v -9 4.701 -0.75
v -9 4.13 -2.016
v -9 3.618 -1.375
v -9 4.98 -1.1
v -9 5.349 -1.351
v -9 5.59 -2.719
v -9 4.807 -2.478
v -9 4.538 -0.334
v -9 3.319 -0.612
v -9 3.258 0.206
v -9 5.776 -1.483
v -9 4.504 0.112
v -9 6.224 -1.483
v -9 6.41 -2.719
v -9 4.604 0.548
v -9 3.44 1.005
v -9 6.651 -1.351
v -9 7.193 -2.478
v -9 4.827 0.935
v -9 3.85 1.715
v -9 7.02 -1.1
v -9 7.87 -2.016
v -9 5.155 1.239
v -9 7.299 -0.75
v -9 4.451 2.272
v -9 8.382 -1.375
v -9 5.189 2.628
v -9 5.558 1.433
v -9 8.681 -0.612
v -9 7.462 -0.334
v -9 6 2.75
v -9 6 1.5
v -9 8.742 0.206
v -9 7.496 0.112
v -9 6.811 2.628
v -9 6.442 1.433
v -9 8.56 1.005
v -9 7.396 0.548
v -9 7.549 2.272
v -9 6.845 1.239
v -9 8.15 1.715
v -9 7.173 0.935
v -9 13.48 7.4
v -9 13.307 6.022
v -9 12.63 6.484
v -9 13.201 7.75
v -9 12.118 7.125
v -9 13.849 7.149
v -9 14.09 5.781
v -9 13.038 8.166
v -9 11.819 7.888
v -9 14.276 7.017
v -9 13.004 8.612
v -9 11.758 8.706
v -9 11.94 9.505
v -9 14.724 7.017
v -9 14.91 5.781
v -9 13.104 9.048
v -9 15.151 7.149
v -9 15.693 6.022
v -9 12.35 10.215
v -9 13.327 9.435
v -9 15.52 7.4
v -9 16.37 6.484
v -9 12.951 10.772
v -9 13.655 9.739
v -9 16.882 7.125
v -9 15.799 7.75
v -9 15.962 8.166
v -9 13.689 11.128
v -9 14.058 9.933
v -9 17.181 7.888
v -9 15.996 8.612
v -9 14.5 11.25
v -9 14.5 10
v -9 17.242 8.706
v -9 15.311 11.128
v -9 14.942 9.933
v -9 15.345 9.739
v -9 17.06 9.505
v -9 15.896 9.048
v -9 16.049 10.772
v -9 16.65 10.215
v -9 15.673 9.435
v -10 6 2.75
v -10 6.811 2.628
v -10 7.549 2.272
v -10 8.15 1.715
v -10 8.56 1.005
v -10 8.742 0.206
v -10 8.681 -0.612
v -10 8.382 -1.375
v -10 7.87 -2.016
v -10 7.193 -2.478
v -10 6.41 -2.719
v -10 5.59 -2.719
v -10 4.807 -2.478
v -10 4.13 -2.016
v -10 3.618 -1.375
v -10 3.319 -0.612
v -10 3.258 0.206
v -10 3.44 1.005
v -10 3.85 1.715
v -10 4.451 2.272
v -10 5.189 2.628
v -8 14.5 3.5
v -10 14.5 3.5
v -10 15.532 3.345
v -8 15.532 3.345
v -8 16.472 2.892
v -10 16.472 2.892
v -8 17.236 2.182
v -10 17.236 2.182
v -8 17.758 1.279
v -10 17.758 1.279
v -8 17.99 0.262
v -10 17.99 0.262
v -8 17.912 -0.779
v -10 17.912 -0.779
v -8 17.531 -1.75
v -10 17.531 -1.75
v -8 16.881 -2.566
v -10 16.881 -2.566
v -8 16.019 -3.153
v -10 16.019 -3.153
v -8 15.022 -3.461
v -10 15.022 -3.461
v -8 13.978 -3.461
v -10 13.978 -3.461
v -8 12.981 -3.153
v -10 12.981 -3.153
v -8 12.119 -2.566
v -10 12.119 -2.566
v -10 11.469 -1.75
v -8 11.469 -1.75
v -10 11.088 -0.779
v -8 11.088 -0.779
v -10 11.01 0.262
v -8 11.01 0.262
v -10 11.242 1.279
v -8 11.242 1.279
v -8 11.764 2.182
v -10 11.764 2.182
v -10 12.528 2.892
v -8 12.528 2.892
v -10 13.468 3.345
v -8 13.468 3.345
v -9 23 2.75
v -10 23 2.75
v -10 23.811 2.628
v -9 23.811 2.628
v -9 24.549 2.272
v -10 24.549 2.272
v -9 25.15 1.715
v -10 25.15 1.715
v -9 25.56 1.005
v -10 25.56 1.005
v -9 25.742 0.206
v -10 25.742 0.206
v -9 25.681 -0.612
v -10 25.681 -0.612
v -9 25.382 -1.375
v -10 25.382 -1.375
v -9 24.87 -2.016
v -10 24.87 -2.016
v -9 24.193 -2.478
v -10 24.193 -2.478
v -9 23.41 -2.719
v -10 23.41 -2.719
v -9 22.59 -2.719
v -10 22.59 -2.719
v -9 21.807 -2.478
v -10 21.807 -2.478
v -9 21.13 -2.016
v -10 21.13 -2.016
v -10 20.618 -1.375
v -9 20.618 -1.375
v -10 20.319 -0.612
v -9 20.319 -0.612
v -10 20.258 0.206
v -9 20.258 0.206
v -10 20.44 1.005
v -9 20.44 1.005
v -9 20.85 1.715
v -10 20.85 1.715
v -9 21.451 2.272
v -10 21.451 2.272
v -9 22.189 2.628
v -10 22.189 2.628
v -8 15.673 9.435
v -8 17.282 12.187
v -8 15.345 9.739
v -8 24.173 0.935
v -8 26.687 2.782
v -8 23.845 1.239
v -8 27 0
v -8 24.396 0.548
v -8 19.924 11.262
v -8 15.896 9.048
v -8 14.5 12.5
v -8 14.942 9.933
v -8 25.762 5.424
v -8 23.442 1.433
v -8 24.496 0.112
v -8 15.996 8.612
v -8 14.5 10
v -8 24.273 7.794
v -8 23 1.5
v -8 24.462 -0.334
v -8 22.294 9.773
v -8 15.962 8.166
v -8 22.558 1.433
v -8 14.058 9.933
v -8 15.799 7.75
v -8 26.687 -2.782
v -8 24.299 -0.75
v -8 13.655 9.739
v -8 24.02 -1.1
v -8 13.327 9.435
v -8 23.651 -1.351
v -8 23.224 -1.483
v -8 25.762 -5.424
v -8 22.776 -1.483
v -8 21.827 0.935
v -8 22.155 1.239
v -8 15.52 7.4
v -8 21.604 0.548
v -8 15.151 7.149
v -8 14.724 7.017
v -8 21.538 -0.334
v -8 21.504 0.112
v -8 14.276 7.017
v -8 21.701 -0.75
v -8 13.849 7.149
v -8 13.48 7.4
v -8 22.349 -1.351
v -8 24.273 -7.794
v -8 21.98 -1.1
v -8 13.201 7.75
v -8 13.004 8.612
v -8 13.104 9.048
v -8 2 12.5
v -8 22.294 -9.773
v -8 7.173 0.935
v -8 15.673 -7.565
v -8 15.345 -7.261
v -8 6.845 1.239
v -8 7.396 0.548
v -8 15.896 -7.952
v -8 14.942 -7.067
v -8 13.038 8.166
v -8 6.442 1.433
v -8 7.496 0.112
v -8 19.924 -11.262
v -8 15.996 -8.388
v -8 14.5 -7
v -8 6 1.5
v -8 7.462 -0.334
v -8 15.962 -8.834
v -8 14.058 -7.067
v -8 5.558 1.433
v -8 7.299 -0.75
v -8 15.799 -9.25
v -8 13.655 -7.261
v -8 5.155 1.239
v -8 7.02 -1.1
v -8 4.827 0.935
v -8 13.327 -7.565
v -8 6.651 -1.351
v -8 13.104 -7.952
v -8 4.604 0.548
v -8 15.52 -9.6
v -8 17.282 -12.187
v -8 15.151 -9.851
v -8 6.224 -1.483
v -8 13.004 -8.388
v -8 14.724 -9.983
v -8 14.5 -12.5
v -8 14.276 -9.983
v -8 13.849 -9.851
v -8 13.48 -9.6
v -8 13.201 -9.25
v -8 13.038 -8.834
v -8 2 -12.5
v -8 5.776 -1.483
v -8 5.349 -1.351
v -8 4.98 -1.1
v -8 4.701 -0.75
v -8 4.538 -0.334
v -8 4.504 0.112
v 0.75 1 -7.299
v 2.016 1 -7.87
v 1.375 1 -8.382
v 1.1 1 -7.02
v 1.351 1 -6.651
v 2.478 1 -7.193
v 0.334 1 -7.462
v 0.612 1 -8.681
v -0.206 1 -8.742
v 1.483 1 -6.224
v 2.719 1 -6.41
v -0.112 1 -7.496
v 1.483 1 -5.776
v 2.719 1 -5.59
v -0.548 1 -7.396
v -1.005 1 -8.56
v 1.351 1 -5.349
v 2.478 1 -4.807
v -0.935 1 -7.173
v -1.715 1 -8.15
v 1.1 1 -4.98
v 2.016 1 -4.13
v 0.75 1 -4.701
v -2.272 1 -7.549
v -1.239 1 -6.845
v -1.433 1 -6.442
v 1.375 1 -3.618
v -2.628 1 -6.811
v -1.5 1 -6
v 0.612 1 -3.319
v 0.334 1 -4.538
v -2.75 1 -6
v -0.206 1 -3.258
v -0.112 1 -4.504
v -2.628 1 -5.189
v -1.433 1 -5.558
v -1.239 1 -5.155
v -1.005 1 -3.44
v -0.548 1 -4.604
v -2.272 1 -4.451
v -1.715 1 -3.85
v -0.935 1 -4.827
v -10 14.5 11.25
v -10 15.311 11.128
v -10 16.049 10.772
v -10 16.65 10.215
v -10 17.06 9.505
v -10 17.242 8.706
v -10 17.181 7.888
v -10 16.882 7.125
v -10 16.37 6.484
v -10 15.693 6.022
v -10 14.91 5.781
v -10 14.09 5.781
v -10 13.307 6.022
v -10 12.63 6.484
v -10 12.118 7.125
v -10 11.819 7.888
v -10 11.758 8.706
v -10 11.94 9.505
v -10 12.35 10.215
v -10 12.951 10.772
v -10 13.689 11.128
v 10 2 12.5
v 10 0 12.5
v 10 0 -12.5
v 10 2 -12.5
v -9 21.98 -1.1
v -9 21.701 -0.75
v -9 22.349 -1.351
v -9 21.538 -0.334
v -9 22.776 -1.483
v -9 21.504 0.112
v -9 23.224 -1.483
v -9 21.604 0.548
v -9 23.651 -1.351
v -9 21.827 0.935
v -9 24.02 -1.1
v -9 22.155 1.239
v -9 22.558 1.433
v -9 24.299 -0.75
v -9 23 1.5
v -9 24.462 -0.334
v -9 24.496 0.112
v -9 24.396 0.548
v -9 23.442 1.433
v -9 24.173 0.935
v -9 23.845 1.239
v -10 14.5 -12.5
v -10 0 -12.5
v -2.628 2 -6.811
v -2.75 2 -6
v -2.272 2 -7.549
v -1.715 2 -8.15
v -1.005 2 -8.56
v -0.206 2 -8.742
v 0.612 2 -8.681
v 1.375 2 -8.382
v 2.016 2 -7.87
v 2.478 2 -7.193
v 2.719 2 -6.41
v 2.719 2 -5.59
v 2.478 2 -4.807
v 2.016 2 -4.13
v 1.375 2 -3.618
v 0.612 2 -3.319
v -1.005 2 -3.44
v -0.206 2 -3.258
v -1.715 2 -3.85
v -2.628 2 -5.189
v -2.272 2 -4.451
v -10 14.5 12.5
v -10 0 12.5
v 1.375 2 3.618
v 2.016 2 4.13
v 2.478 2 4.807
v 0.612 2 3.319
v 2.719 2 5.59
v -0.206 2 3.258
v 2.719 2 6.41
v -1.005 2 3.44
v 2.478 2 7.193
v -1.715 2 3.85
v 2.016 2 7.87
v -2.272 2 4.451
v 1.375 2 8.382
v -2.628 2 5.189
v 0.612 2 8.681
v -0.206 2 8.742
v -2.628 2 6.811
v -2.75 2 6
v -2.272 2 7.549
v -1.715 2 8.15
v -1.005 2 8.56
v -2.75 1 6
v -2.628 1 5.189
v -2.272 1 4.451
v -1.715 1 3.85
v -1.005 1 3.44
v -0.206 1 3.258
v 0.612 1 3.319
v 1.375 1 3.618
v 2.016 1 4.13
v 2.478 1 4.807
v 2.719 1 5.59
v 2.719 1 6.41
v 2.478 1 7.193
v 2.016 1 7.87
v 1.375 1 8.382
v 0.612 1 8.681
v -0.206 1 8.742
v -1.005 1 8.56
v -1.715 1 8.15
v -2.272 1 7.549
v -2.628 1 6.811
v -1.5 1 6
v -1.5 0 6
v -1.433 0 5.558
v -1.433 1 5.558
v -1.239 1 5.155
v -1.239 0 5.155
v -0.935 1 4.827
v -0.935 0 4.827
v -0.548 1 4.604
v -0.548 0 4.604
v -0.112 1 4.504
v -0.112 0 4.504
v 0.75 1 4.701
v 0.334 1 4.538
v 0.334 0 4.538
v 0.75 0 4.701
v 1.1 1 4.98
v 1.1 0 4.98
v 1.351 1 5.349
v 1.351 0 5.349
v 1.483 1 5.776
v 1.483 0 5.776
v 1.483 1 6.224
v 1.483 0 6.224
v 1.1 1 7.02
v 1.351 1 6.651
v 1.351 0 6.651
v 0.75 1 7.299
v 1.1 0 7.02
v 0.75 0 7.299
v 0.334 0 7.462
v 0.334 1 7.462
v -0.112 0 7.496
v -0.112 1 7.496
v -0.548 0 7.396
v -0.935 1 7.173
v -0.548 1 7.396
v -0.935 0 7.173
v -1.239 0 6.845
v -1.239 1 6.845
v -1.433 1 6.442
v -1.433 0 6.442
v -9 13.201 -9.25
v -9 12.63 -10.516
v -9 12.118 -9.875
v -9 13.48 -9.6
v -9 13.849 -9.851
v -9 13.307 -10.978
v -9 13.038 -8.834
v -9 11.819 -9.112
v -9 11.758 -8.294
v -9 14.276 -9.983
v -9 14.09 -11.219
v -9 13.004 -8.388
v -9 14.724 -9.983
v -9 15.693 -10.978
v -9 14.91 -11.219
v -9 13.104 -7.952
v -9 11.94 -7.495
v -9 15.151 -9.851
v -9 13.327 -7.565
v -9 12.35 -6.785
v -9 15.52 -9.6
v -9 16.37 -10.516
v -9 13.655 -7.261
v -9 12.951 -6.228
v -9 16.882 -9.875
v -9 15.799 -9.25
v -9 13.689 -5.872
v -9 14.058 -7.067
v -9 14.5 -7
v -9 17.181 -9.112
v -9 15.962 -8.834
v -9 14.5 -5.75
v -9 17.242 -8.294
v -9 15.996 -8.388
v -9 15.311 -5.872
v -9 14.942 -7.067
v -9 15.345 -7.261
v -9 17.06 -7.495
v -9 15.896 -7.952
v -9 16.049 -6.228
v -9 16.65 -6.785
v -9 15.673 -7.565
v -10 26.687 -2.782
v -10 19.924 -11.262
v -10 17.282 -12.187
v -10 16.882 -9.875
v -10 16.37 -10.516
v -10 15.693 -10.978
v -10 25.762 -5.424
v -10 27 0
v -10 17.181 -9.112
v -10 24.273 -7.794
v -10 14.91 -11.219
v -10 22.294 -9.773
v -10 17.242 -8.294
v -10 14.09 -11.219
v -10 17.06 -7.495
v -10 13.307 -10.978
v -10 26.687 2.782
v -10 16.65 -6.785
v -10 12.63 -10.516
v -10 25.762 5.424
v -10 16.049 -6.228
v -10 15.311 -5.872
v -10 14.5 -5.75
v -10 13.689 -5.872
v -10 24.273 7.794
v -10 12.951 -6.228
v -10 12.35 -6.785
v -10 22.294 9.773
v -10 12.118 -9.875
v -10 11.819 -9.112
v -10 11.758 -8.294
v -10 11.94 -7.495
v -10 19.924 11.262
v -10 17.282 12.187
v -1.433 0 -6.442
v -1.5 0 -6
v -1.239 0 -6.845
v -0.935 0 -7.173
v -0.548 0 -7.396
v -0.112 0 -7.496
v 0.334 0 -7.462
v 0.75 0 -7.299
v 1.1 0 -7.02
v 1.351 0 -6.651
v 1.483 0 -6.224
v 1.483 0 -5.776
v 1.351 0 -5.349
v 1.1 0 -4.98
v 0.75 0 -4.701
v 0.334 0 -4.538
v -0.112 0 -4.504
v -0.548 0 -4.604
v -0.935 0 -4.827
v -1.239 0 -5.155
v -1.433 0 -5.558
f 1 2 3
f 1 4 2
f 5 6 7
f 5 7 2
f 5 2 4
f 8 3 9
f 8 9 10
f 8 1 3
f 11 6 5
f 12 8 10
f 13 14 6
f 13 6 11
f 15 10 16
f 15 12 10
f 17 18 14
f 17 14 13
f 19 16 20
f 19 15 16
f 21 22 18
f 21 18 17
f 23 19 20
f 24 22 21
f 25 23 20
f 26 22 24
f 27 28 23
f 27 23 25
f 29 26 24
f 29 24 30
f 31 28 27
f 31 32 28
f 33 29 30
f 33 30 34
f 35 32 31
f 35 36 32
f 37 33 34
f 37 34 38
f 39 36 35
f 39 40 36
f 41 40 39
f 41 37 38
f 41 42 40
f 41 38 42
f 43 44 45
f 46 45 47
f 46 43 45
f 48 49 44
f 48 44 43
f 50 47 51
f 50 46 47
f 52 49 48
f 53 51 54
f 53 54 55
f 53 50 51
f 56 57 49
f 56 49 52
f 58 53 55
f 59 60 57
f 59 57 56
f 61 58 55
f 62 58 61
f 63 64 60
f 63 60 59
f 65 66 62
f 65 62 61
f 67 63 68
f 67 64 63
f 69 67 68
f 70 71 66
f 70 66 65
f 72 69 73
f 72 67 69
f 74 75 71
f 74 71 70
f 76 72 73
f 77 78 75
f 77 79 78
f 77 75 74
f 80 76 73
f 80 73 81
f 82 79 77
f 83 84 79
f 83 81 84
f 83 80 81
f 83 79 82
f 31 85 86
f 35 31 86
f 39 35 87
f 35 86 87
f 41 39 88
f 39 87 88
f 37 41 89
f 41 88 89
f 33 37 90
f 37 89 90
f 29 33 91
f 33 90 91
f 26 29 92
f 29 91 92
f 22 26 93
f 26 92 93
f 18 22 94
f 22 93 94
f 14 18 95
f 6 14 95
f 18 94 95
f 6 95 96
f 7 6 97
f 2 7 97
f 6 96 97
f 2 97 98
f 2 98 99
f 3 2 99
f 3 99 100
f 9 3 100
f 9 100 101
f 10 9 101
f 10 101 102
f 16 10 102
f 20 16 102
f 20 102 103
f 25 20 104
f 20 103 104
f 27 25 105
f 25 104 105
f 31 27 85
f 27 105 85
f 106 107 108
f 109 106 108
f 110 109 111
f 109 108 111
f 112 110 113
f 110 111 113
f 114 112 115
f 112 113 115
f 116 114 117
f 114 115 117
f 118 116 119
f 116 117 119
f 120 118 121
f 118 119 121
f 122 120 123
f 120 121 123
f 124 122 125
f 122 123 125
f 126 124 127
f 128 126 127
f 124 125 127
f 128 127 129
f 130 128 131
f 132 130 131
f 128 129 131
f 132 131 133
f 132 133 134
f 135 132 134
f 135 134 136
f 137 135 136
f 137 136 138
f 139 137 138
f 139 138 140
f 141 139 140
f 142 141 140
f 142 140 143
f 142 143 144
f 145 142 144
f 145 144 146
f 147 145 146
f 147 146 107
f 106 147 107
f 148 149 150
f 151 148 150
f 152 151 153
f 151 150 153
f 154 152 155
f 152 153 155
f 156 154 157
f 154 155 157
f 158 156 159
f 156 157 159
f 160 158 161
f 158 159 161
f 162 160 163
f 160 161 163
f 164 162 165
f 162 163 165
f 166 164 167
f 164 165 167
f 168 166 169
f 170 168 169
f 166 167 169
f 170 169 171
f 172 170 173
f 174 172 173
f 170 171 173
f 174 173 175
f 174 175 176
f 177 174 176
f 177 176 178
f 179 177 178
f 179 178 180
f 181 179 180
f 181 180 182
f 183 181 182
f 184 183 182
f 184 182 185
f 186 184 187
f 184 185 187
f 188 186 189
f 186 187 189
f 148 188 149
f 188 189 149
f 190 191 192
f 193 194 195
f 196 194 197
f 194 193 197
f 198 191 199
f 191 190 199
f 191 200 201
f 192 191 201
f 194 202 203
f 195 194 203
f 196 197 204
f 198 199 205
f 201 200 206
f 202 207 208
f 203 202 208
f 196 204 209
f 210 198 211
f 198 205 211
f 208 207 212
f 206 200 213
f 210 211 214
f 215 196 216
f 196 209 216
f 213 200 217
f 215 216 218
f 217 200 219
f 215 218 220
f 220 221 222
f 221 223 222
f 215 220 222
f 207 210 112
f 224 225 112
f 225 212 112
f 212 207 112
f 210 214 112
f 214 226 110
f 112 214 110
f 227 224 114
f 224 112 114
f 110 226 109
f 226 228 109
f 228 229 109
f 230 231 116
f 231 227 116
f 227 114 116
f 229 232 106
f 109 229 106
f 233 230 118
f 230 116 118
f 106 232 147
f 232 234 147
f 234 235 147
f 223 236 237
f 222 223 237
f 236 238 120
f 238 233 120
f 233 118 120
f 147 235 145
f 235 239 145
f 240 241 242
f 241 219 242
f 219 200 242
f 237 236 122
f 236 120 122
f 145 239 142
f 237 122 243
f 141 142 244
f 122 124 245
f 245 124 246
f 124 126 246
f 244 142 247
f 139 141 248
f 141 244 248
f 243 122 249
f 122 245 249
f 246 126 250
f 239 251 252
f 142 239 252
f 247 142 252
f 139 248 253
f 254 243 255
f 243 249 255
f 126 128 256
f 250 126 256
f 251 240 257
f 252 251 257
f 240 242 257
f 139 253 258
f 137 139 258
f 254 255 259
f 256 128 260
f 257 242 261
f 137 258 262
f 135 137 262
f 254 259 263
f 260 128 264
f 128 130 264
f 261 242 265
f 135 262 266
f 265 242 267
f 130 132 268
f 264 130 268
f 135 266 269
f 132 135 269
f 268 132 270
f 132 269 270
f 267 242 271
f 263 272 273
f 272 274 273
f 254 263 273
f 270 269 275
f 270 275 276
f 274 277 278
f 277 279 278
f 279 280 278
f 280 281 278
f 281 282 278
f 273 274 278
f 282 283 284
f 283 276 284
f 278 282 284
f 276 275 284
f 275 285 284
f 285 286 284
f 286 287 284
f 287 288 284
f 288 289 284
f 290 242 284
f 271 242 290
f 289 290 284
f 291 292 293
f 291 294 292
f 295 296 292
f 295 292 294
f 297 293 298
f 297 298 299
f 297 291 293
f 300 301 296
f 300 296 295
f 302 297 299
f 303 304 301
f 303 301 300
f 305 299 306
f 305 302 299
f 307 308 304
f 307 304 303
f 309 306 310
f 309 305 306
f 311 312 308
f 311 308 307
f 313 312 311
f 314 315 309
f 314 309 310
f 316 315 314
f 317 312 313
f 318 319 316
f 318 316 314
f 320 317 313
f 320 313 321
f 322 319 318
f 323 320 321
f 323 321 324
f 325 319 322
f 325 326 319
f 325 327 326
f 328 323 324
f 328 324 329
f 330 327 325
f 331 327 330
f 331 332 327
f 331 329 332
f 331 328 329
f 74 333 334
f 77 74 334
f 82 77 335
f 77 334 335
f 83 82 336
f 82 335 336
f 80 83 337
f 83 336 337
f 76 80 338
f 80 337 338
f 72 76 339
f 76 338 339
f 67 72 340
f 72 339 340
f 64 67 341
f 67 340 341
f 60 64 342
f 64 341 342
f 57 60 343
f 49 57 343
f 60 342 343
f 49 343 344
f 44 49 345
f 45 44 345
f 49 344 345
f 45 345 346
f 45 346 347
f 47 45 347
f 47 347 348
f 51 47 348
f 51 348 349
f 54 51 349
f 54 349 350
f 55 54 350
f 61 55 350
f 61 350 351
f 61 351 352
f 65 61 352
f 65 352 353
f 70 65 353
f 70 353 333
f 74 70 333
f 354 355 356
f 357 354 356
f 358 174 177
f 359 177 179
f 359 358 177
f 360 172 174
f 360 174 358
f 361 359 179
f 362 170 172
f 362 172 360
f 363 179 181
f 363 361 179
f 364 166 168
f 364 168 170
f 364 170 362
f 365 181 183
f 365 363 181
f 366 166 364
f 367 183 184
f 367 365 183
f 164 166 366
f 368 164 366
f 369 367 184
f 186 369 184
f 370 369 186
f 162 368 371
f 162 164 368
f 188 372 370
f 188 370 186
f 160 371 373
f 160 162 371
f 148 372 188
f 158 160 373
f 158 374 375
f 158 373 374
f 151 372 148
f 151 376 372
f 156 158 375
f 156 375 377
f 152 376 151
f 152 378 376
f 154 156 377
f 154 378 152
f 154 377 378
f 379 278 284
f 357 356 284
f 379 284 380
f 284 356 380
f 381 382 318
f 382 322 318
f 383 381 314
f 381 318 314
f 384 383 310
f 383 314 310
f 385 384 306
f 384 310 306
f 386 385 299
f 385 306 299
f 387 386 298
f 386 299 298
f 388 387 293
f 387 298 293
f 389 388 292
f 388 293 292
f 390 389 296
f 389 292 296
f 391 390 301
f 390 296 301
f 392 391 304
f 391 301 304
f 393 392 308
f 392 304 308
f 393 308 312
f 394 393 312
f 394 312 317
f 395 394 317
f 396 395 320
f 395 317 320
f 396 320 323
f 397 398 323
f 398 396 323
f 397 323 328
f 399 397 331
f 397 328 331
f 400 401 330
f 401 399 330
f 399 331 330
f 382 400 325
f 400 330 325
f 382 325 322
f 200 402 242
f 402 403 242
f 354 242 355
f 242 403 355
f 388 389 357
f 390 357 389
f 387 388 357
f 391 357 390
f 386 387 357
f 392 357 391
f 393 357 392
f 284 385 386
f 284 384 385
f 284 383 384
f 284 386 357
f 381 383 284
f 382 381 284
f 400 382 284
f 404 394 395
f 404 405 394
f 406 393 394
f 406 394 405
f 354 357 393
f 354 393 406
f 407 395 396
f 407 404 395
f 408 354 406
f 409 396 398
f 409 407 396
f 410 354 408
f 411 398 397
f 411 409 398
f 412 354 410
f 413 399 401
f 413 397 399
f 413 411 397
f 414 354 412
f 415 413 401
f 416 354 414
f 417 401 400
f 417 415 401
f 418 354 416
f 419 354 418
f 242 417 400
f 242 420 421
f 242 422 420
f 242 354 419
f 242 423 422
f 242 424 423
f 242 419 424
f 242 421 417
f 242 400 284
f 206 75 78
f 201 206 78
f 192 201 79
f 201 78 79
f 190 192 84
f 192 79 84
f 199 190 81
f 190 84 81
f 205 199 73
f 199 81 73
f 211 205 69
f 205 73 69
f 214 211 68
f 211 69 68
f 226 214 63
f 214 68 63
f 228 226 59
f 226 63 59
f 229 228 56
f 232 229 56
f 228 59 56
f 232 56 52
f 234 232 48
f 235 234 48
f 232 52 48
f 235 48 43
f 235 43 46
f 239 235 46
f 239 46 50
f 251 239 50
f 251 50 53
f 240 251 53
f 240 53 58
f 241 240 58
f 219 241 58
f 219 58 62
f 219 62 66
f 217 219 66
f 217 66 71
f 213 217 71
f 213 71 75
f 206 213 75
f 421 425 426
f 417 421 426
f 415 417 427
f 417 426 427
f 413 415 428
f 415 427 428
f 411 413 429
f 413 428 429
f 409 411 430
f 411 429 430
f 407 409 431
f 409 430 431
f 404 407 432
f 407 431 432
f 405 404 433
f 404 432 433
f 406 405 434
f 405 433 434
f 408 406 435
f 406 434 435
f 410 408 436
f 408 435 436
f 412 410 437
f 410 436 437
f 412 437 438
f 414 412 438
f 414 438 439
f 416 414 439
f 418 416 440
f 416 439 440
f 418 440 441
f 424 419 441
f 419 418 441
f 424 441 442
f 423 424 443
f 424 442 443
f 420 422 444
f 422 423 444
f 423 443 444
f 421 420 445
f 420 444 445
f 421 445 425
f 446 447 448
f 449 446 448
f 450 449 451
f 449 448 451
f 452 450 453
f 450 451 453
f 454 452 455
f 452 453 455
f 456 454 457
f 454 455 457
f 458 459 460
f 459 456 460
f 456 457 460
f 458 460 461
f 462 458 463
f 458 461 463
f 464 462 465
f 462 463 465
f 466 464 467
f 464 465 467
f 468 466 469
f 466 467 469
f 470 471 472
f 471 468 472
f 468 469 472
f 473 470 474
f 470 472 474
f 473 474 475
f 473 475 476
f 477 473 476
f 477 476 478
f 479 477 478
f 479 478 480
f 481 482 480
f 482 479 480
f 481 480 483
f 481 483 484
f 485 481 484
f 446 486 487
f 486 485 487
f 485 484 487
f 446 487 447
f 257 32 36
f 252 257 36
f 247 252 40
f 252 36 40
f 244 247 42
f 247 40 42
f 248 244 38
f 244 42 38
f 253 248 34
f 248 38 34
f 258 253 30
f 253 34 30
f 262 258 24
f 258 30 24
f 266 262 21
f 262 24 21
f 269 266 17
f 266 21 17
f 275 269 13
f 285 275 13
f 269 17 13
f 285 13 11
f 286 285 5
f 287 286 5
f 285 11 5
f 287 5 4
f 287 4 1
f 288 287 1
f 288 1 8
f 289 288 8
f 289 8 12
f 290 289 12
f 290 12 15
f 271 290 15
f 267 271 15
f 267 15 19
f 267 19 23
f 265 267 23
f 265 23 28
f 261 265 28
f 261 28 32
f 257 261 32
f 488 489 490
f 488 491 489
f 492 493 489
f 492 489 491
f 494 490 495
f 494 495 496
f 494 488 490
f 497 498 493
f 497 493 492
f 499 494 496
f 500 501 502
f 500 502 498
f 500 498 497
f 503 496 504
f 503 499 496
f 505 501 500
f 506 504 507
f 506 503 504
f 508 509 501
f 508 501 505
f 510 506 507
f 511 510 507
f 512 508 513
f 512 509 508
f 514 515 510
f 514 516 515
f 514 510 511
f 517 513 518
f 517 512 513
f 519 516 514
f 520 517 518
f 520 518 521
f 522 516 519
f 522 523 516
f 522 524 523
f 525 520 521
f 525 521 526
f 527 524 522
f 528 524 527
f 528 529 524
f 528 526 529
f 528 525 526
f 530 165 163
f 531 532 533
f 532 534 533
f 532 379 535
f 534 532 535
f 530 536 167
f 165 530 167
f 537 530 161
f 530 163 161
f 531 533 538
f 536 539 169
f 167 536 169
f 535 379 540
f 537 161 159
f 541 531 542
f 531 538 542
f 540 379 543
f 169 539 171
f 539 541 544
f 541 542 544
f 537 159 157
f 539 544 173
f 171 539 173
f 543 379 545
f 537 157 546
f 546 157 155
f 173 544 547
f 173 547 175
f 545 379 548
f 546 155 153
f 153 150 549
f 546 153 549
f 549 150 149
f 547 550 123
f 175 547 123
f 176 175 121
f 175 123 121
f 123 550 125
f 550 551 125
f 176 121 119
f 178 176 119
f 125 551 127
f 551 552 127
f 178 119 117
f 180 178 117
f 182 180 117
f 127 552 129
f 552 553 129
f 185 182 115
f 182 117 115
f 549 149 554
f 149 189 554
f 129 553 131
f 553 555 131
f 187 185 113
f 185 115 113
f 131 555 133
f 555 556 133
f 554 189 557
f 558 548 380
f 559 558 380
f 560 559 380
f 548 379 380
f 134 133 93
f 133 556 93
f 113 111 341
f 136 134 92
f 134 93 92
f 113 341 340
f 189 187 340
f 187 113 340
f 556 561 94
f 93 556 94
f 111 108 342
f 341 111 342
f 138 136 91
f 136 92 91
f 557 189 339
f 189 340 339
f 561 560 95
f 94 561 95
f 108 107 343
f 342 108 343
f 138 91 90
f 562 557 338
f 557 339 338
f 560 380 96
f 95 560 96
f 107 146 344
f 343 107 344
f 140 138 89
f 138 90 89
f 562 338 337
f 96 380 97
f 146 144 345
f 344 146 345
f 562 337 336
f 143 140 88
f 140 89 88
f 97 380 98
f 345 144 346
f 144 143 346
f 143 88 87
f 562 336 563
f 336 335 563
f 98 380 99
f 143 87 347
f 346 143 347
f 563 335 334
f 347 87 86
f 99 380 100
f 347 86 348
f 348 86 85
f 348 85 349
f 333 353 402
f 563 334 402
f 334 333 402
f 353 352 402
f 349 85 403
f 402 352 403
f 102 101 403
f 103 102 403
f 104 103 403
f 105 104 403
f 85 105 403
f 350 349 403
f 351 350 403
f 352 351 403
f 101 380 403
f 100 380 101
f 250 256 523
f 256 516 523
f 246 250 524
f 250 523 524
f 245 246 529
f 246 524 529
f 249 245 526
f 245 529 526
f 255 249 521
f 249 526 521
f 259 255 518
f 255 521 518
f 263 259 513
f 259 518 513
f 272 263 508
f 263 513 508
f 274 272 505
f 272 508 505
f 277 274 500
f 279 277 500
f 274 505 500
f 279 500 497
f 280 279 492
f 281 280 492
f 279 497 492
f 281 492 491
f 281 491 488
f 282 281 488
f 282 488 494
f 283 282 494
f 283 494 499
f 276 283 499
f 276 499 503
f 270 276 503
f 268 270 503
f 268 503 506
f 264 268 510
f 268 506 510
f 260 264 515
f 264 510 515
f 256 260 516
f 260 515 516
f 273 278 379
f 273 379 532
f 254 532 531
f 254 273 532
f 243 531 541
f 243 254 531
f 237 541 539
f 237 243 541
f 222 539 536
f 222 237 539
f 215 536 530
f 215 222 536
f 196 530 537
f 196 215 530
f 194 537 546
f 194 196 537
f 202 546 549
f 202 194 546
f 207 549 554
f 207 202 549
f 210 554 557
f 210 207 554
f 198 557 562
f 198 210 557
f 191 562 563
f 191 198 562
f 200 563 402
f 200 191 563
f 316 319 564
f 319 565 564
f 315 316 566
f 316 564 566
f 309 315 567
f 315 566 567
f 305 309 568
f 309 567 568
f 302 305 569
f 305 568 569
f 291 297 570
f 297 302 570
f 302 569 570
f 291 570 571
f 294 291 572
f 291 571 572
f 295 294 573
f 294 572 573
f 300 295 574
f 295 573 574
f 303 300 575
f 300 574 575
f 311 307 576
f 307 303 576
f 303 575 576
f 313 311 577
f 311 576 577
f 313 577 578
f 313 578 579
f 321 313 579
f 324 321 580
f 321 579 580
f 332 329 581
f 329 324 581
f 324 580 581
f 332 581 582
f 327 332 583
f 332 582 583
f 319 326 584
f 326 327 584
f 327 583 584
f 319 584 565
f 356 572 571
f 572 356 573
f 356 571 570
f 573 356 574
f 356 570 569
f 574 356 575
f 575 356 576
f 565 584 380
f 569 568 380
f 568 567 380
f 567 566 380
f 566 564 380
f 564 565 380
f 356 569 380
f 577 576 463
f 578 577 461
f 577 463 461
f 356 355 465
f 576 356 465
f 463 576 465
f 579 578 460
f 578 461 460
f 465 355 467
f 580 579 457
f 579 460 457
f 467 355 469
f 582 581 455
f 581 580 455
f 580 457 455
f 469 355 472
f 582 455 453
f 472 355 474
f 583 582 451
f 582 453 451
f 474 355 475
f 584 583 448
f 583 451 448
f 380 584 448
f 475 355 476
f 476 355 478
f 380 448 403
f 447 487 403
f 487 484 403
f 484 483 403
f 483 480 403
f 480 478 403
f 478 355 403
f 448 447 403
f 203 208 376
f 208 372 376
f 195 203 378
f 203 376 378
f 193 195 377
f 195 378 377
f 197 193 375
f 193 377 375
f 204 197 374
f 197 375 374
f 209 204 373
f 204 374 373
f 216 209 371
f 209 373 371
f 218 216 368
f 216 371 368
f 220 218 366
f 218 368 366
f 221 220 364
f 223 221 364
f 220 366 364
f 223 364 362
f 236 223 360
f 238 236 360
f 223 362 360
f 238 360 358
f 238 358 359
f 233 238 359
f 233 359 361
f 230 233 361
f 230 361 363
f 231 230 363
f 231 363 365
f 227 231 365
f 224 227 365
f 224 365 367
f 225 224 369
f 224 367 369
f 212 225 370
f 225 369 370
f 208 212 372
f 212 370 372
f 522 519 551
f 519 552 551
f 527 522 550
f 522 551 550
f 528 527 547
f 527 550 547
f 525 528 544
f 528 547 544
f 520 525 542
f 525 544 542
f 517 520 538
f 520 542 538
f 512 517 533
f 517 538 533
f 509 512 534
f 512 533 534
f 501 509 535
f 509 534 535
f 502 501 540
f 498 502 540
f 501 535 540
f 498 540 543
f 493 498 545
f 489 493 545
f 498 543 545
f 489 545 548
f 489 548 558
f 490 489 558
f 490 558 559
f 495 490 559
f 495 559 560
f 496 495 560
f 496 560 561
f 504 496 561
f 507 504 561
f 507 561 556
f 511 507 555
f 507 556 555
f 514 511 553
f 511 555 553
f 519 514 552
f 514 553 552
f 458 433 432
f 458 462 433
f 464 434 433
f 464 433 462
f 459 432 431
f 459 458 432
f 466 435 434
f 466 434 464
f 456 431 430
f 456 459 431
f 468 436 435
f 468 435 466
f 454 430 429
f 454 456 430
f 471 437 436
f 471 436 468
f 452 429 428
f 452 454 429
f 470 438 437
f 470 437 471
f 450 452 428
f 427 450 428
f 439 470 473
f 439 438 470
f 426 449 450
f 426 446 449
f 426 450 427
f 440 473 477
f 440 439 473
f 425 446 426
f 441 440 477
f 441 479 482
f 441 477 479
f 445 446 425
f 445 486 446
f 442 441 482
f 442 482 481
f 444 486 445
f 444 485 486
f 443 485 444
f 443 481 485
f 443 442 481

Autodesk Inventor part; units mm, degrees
ref_plane "YZ Plane" through (0, 0, 0) normal (1, 0, 0) x (0, 1, 0)
ref_plane "XZ Plane" through (0, 0, 0) normal (0, 1, 0) x (-1, 0, 0)
ref_plane "XY Plane" through (0, 0, 0) normal (0, 0, 1) x (1, 0, 0)
sketch "Sketch1" plane through (0, 0, 0) normal (0, 1, 0) x (-1, 0, 0)
  line L0 (10, 12.5) -> (-10, 12.5)
  line L1 (-10, 12.5) -> (-10, -12.5)
  line L2 (-10, -12.5) -> (10, -12.5)
  line L3 (10, -12.5) -> (10, 12.5)
  line L4 (10, 0) -> (-10, 0) construction
  line L5 (0, 12.5) -> (0, -12.5) construction
  line L6 (10, 12.5) -> (8, 12.5)
  line L7 (8, 12.5) -> (8, -12.5)
  line L8 (8, -12.5) -> (10, -12.5)
  line L9 (10, -12.5) -> (10, 12.5)
  circle A0 centre (0, 6) radius 1.5
  circle A1 centre (0, 6) radius 2.75
  circle A2 centre (0, -6) radius 1.5
  circle A3 centre (0, -6) radius 2.75
  point P0 (0, 0)
  point P1 (0, 0)
  dimension "d0" = 20
  dimension "d1" = 25
  dimension "d2" = 2
  dimension "d3" = 3
  dimension "d4" = 5.5
  dimension "d5" = 6
extrude "Extrusion1" add sketch "Sketch1" along normal blind 2 contours L7 L2 L1 L0
extrude "Extrusion2" add sketch "Sketch1" along normal blind 1 contours A1 | A3
extrude "Extrusion3" add sketch "Sketch1" along normal blind 27 contours L3 L2 L7 L0
sketch "Sketch2" plane through (-8, 2, -12.5) normal (1, 0, 0) x (0, 0, -1)
  circle A0 centre (-12.5, 12.5) radius 12.5
  line L0 (-25, 25) -> (0, 25) projected
  line L1 (-12.5, 25) -> (-25, 25)
  line L2 (-25, 25) -> (-25, 12.5)
  line L3 (-25, 0) -> (-25, 25) projected
  line L4 (-12.5, 25) -> (0, 25)
  line L5 (0, 25) -> (0, 12.5)
  line L6 (0, 0) -> (0, 25) projected
  point P0 (-12.5, -2)
  point P1 (-25, 12.5)
  dimension "d12" = 25
extrude "Extrusion4" cut sketch "Sketch2" against normal blind 2 contours A0 L0 L5 | A0 L2 L0
sketch "Sketch3" plane through (-10, 0, -12.5) normal (-1, 0, 0) x (0, 0, 1)
  arc A0 (25, 14.5) -> (0, 14.5) centre (12.5, 14.5) ccw projected
  circle A1 centre (21, 14.5) radius 1.5
  circle A2 centre (21, 14.5) radius 2.75
  line L0 (12.5, 14.5) -> (12.5, 17.4625)
  circle A3 centre (4, 14.5) radius 1.5
  circle A4 centre (4, 14.5) radius 2.75
  circle A5 centre (12.5, 14.5) radius 3.5
  circle A6 centre (12.5, 6) radius 1.5
  circle A7 centre (12.5, 6) radius 2.75
  circle A8 centre (12.5, 23) radius 1.5
  circle A9 centre (12.5, 23) radius 2.75
  point P0 (12.5, 0)
  dimension "d15" = 3
  dimension "d16" = 5.5
  dimension "d17" = 8.5
  dimension "d22" = 7
  dimension "d25" = 3
  dimension "d26" = 5.5
  dimension "d27" = 8.5
  dimension "d28" = 3
  dimension "d29" = 5.5
  dimension "d30" = 8.5
extrude "Extrusion5" cut sketch "Sketch3" against normal blind 2 contours A1 | A3 | A6 | A8
extrude "Extrusion6" cut sketch "Sketch3" against normal blind 1 contours A2 | A4 | A7 | A9
extrude "Extrusion7" cut sketch "Sketch3" against normal blind 2 contours A5
properties part number "Bracket Motor JGA Depan_3DPrint"
